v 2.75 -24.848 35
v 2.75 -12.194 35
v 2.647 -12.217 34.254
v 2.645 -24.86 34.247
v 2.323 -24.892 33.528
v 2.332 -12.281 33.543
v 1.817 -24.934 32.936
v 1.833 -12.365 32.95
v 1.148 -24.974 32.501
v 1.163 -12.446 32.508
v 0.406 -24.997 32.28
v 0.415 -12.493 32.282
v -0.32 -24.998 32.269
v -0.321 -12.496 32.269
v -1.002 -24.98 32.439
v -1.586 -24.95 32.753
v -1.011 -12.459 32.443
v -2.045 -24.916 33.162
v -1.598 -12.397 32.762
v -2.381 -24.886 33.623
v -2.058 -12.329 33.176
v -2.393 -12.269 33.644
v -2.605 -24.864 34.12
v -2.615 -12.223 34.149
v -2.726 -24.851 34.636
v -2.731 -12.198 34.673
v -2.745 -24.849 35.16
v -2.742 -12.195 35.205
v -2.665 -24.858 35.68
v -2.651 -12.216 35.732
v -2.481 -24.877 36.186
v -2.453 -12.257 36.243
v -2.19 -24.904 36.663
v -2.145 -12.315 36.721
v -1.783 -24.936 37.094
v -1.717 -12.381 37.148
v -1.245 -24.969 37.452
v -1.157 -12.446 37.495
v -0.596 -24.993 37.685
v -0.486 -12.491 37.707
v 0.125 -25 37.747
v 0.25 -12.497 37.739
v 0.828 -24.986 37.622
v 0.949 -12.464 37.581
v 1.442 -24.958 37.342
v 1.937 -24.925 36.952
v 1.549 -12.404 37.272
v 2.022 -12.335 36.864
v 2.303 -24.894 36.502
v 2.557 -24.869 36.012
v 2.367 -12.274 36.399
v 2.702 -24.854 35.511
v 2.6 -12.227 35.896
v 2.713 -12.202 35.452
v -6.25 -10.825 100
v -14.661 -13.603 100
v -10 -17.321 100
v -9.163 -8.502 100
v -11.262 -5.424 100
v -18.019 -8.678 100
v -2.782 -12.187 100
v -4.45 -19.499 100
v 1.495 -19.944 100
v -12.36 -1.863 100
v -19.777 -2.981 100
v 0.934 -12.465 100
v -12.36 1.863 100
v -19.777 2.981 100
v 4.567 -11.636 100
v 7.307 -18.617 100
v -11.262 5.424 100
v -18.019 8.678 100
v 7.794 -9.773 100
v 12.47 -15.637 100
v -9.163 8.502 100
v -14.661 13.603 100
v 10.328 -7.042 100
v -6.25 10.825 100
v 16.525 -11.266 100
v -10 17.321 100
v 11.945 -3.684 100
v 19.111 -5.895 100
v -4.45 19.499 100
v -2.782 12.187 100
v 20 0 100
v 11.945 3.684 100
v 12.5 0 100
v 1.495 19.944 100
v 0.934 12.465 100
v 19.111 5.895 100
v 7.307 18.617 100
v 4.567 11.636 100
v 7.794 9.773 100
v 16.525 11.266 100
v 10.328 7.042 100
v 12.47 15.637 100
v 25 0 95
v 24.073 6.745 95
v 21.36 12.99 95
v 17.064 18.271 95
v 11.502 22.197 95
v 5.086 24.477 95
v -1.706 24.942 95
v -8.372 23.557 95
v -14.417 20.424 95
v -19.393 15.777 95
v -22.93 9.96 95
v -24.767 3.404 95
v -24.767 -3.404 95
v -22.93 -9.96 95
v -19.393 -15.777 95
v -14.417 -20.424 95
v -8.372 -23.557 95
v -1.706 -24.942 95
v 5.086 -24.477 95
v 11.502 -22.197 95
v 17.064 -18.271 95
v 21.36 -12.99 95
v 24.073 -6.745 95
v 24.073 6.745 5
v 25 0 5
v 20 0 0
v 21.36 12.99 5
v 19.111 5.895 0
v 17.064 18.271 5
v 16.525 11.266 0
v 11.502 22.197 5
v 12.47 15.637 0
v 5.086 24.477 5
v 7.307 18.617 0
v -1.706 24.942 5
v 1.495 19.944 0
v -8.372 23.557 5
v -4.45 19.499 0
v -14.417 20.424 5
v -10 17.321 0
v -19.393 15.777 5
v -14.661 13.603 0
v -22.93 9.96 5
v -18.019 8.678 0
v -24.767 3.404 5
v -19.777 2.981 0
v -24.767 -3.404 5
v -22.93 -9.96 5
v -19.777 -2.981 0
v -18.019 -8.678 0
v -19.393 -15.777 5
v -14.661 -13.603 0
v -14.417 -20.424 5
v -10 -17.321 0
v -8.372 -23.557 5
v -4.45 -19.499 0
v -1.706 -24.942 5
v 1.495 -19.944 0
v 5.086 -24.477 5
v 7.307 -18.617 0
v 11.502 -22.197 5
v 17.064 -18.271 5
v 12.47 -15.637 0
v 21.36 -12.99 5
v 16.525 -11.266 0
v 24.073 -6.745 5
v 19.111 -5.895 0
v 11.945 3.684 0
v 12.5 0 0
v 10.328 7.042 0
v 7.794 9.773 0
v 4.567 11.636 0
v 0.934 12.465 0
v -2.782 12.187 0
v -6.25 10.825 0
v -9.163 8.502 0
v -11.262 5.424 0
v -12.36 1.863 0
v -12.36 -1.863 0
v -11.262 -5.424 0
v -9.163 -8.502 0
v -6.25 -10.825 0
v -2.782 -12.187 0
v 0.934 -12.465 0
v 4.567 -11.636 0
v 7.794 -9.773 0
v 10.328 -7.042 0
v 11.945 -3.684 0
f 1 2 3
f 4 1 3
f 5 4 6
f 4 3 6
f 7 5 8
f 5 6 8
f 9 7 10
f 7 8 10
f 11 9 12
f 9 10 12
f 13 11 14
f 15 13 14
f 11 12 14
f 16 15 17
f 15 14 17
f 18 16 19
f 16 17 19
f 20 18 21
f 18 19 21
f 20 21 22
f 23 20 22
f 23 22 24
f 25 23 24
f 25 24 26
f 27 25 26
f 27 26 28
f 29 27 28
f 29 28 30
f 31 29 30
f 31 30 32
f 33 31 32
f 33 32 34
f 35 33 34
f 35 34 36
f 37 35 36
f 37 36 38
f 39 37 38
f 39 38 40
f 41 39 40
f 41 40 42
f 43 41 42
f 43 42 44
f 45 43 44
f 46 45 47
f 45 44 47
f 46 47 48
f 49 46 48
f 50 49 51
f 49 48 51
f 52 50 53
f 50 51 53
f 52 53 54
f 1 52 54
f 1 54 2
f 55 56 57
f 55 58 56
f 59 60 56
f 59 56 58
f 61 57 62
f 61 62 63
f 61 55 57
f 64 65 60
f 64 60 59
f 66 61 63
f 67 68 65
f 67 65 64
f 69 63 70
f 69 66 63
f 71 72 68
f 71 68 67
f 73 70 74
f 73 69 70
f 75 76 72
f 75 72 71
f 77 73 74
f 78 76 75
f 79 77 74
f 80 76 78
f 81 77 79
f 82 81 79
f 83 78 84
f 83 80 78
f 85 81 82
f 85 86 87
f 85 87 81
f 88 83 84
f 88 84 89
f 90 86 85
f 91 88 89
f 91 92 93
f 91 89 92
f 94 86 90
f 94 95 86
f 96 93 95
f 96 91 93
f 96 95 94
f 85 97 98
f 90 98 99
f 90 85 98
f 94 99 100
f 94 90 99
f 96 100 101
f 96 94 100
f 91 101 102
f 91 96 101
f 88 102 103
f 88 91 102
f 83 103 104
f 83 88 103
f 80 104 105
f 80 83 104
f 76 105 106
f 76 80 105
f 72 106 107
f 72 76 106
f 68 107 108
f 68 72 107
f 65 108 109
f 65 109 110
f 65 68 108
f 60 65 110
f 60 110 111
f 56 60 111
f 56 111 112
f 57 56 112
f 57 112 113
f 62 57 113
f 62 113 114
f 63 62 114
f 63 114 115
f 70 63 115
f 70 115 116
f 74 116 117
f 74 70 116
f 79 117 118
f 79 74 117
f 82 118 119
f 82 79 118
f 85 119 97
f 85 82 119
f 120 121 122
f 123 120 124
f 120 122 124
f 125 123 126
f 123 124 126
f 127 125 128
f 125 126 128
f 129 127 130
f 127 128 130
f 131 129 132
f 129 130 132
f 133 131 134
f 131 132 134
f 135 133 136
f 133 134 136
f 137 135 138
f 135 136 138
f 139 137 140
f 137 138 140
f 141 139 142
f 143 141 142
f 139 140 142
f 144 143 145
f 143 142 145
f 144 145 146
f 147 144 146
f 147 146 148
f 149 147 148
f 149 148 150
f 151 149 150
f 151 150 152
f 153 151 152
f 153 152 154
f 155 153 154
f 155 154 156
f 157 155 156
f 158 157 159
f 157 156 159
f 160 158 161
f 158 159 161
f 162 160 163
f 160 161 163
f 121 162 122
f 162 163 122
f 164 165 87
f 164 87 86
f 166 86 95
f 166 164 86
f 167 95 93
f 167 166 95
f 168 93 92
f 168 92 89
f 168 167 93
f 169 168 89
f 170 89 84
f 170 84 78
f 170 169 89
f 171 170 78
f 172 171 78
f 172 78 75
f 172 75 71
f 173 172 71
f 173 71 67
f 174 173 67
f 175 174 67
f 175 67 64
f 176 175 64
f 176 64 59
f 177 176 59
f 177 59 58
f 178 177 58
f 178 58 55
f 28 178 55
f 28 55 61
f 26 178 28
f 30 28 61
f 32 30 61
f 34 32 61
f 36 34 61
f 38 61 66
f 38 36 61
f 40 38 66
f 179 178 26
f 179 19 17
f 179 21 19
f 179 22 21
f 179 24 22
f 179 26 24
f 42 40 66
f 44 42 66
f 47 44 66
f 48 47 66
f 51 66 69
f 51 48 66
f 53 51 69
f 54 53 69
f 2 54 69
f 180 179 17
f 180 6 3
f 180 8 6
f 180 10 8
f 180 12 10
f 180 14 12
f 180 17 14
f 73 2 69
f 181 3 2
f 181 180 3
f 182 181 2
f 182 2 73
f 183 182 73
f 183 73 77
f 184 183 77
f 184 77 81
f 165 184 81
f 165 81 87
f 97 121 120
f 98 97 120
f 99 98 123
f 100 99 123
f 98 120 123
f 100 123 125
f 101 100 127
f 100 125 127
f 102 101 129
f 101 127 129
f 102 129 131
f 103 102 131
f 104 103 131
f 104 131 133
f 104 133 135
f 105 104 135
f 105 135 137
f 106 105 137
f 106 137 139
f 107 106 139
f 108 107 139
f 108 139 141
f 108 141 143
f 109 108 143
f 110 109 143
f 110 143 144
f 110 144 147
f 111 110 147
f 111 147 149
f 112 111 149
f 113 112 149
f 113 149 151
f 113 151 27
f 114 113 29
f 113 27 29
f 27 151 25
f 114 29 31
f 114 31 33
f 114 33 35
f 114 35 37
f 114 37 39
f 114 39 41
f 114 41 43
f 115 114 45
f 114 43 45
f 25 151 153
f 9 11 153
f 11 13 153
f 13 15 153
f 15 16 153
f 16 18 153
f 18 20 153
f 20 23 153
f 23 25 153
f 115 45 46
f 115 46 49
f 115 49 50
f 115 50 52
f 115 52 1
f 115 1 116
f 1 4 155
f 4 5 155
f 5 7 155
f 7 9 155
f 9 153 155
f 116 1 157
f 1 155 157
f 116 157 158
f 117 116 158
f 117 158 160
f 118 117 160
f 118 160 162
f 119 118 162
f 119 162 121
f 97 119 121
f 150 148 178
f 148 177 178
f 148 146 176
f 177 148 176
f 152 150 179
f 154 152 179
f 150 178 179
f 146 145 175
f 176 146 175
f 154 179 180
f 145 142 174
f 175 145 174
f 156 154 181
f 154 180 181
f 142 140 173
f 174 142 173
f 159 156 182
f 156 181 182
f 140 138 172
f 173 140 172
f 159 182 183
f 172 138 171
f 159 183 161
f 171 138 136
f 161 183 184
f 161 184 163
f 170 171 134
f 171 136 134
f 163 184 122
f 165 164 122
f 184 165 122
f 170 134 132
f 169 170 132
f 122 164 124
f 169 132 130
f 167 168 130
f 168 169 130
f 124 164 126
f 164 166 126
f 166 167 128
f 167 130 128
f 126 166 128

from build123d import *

# Parameters (mm, degrees)
F0_R     = 25
F0_R_2   = 12.5
F1_DEPTH = 100
F2_SIZE  = 5
F3_SIZE  = 5
F5_D     = 5.5
F5_DEPTH = 25.001


with BuildPart() as f1:
    # F0 (on Top) → F1 (new body)
    with BuildSketch(Plane.XY):
        Circle(F0_R)
        Circle(F0_R_2, mode=Mode.SUBTRACT)
    extrude(amount=F1_DEPTH)

    # F2
    f2_edges = [f1.edges().sort_by_distance(p)[0] for p in [
        (-25, 0, 100),
    ]]
    chamfer(f2_edges, length=F2_SIZE)

    # F3
    f3_edges = [f1.edges().sort_by_distance(p)[0] for p in [
        (-25, 0, 0),
    ]]
    chamfer(f3_edges, length=F3_SIZE)

    # F5 (through all, one way)
    with BuildSketch(Plane(origin=(0, 0, 0), x_dir=(1, 0, 0), z_dir=(0, 1, 0))):
        with Locations((0, -35)):
            Circle(F5_D / 2)
    extrude(amount=-F5_DEPTH, mode=Mode.SUBTRACT)


solid = f1.part
